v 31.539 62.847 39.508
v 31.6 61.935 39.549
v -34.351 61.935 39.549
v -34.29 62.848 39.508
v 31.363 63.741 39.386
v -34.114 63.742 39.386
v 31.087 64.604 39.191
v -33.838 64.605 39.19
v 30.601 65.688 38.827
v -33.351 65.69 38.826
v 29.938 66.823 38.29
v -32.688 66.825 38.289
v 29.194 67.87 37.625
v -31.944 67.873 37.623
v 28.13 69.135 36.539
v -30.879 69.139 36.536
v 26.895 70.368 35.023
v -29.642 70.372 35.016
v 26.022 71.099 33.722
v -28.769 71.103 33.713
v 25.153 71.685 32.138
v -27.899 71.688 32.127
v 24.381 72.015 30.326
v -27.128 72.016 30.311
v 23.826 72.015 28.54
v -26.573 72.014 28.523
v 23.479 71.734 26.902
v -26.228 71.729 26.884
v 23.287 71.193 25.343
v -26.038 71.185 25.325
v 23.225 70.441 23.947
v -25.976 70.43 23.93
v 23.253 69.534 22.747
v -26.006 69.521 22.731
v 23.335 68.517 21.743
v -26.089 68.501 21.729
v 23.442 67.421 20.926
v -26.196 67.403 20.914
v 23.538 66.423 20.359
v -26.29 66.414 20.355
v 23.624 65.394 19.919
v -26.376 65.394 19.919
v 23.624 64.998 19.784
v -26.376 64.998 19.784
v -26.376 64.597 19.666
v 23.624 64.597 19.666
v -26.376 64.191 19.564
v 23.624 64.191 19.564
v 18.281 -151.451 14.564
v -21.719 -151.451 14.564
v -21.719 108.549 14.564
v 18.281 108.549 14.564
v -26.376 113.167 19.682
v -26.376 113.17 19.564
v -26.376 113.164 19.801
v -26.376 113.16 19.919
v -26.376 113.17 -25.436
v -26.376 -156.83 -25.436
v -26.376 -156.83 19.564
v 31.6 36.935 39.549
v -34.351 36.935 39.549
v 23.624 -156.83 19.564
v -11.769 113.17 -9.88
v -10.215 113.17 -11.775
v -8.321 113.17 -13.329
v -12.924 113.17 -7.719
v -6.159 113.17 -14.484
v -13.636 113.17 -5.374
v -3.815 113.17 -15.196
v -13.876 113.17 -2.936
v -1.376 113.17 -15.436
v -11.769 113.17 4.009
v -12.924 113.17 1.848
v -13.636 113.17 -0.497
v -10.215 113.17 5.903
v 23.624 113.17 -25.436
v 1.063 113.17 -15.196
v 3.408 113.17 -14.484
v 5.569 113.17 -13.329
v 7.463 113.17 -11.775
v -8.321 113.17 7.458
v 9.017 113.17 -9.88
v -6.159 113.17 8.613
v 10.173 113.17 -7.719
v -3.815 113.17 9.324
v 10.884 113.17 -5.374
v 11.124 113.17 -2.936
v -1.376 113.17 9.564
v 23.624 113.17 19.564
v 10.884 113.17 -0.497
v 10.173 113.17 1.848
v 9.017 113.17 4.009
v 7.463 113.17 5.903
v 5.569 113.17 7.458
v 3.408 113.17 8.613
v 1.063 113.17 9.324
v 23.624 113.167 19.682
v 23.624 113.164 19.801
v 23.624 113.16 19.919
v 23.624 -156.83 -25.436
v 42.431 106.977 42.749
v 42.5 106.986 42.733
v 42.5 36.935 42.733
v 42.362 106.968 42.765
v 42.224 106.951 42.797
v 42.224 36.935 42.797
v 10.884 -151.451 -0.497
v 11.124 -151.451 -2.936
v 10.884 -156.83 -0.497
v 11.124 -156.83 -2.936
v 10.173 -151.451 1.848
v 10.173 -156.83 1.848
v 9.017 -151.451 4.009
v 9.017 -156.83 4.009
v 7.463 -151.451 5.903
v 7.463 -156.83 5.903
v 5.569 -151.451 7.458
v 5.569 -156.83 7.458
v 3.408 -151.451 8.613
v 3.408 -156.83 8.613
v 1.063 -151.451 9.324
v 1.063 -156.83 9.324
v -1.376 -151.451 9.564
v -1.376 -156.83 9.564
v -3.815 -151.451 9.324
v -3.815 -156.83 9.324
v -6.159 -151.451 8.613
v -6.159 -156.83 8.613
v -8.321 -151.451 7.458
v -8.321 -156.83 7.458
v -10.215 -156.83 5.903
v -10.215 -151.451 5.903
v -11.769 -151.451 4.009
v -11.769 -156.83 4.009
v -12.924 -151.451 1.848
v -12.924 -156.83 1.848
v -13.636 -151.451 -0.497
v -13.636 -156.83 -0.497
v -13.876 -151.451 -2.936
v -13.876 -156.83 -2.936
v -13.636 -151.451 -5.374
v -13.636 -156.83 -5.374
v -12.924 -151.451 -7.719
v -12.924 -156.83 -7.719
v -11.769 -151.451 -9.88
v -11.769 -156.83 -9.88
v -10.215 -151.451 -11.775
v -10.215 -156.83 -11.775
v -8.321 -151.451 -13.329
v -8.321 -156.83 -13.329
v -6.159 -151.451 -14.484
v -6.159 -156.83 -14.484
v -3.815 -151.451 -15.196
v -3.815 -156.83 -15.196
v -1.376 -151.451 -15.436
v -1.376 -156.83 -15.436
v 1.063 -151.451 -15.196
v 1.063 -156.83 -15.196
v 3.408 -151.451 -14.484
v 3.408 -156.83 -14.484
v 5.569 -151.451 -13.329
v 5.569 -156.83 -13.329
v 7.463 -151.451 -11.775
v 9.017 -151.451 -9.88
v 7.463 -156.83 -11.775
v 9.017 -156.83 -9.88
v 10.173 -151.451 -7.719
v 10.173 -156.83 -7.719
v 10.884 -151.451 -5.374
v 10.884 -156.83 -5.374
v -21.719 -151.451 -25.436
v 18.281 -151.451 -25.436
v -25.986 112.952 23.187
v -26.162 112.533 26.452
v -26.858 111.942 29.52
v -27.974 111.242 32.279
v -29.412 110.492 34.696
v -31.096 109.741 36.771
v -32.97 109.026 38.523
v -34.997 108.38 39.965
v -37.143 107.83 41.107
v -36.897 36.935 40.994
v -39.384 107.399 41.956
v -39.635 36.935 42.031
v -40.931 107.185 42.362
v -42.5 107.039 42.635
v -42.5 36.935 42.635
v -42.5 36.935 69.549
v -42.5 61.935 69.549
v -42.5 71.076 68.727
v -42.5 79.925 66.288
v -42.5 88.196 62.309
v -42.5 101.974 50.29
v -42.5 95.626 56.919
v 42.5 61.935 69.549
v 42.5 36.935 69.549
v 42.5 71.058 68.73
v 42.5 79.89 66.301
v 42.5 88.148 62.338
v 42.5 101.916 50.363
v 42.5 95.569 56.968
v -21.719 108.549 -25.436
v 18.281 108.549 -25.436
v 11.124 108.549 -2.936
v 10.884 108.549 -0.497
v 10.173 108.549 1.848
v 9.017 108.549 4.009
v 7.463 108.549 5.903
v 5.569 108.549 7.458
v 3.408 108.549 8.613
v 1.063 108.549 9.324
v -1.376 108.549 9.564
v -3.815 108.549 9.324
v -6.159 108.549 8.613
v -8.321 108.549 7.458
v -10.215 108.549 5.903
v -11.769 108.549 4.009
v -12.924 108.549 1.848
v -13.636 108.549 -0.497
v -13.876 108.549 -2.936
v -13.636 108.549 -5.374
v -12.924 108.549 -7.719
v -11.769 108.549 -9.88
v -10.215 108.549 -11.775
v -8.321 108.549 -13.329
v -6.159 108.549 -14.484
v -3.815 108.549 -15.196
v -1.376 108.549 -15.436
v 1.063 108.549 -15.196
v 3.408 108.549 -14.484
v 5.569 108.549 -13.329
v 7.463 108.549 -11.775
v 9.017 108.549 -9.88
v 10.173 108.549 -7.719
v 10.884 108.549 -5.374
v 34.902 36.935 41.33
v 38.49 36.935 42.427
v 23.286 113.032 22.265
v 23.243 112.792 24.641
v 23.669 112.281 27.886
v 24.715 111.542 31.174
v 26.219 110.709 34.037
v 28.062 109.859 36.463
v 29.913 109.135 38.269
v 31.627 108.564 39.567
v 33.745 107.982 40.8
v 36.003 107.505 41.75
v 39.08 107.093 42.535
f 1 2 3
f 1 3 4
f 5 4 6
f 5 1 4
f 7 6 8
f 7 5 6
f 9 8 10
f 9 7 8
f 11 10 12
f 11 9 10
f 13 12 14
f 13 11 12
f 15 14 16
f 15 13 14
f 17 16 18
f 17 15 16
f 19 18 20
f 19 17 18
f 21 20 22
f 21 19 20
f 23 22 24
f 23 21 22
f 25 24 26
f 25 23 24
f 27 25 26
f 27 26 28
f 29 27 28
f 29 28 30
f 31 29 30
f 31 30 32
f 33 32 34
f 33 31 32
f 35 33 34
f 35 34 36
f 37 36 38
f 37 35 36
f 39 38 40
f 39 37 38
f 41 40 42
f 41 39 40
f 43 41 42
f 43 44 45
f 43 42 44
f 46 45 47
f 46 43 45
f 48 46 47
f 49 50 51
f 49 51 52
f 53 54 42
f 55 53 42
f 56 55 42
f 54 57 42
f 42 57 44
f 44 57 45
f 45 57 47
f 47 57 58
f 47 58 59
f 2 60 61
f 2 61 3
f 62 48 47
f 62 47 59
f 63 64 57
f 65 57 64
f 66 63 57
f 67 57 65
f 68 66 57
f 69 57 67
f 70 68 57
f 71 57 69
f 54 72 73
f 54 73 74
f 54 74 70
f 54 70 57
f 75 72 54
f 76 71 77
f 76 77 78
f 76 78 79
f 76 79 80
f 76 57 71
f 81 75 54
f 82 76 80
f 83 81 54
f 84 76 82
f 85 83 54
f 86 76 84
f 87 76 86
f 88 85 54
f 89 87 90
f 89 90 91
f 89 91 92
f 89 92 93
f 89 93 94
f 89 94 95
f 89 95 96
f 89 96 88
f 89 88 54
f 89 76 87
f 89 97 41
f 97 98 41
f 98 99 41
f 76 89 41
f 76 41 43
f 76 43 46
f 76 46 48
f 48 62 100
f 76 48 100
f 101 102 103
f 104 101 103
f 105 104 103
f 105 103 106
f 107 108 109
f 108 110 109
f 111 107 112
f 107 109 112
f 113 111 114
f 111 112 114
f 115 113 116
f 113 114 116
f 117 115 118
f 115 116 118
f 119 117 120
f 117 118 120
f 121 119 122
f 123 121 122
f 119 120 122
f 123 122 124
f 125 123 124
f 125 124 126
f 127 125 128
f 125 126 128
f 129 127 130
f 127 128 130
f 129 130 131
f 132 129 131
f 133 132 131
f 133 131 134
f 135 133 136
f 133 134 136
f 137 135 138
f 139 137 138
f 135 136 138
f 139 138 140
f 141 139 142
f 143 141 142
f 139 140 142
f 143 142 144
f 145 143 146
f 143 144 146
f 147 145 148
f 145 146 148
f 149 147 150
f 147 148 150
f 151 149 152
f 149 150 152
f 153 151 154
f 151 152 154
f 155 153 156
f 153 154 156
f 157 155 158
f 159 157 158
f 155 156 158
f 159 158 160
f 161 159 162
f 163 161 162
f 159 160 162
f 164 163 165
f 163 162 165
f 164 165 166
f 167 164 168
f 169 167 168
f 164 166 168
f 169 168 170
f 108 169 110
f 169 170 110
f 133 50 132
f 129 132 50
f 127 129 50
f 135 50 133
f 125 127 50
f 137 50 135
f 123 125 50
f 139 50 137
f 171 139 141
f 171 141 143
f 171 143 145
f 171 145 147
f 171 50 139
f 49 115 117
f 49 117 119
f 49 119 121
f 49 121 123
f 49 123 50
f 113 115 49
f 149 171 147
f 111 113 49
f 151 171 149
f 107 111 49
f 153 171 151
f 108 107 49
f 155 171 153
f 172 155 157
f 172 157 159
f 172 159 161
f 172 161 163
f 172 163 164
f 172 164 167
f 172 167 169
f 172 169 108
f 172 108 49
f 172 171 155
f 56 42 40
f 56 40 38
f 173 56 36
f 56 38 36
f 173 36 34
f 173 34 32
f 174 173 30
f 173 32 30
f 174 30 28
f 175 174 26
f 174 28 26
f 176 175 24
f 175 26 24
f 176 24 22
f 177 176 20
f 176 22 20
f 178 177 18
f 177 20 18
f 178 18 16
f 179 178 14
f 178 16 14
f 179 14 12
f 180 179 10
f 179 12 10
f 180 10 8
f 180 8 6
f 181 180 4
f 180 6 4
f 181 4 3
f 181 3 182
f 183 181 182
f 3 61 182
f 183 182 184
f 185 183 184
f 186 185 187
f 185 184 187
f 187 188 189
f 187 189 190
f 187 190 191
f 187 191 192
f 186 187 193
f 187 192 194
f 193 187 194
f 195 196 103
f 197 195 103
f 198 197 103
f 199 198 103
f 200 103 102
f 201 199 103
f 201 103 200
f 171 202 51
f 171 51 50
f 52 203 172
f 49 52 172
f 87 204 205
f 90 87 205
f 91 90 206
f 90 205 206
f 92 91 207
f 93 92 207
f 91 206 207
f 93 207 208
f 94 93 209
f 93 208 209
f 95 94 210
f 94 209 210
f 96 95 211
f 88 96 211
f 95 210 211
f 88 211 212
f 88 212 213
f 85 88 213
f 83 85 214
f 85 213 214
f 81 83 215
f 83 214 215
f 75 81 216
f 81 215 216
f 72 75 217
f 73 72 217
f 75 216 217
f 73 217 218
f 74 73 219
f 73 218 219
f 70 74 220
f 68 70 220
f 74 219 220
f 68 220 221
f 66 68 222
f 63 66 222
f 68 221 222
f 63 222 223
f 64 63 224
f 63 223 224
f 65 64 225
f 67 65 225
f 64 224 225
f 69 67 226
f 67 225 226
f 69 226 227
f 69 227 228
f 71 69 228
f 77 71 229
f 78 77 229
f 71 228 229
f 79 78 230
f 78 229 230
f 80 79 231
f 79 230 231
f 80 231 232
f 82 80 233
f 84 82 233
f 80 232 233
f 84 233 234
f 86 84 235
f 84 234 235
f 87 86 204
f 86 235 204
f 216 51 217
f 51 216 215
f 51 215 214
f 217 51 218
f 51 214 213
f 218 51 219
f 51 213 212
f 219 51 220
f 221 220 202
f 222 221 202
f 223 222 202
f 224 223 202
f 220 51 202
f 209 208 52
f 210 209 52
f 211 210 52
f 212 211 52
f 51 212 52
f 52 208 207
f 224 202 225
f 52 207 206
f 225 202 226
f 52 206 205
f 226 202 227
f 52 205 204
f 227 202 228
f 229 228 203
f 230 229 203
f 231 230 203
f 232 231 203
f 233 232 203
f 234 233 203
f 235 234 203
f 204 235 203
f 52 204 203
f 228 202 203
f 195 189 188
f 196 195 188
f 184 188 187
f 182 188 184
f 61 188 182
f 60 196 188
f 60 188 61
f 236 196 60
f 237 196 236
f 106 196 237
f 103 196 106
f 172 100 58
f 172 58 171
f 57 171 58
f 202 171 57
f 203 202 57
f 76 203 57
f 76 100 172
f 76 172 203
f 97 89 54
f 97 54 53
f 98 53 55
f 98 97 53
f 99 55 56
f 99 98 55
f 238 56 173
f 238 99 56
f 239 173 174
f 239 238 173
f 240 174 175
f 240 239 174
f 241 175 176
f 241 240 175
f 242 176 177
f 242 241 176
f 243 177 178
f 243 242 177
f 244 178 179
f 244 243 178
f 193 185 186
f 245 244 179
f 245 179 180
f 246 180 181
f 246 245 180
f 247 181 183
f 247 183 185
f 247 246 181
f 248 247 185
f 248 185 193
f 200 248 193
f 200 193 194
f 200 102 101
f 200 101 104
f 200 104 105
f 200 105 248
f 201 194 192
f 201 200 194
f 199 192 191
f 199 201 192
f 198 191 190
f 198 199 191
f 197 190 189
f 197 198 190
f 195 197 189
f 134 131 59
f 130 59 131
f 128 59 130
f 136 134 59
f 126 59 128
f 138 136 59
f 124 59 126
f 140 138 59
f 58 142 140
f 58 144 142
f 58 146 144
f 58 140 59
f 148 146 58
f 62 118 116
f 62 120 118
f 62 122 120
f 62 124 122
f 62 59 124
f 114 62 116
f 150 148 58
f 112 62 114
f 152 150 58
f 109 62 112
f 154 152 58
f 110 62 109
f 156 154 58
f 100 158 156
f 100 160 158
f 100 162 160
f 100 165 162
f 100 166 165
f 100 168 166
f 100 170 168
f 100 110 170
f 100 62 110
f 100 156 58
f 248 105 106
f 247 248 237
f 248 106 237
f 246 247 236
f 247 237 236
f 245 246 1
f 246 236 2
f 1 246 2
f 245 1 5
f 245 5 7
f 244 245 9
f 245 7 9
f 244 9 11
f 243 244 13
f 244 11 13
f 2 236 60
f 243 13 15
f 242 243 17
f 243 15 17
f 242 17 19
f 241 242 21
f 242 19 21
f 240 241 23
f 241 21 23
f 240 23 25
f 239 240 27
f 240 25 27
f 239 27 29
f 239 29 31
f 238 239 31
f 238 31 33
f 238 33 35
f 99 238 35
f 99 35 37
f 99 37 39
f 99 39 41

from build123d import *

# Parameters (mm, degrees)
F1_DEPTH = 42.5
F3_DEPTH = 174
F4_R     = 12.5
F5_DEPTH = 266
F6_W     = 40
F6_H     = 260
F7_DEPTH = 40


with BuildPart() as f1:
    # F0 (on Right) → F1 (new body, symmetric)
    with BuildSketch(Plane.YZ):
        with BuildLine():
            ThreePointArc((61.934647, 39.548864), (71.990491, 30.564401), (64.190836, 19.564131))
            Line((64.190836, 19.564131), (52.245142, 19.564131))
            Line((52.245142, 19.564131), (-156.829834, 19.564131))
            Line((-156.829834, 19.564131), (-156.829834, -25.435869))
            Line((-156.829834, -25.435869), (113.170166, -25.435869))
            Line((113.170166, -25.435869), (113.170166, 19.564131))
            ThreePointArc((113.170166, 19.564131), (97.724143, 54.982764), (61.934647, 69.548864))
            Line((61.934647, 69.548864), (36.934647, 69.548864))
            Line((36.934647, 69.548864), (36.934647, 39.548864))
            Line((36.934647, 39.548864), (61.934647, 39.548864))
        make_face()
    extrude(amount=F1_DEPTH, both=True)

    # F2 (on Front) → F3 (cut, symmetric)
    with BuildSketch(Plane.XZ):
        with BuildLine():
            Line((23.624079, 19.918991), (23.624079, -36.902788))
            Line((23.624079, -36.902788), (-26.375921, -36.902788))
            Line((-26.375921, -36.902788), (-26.375921, 19.918991))
            ThreePointArc((-26.375921, 19.918991), (-30.233422, 35.78282), (-44.975936, 42.797067))
            Line((-44.975936, 42.797067), (-64.052075, -61.106175))
            Line((-64.052075, -61.106175), (44.571461, -67.325629))
            Line((44.571461, -67.325629), (64.148389, 37.735406))
            Line((64.148389, 37.735406), (42.224093, 42.797067))
            ThreePointArc((42.224093, 42.797067), (27.481579, 35.78282), (23.624079, 19.918991))
        make_face()
    extrude(amount=F3_DEPTH, both=True, mode=Mode.SUBTRACT)

    # F4 (on Front) → F5 (cut, symmetric)
    with BuildSketch(Plane.XZ):
        with Locations((-1.375921, -2.935869)):
            Circle(F4_R)
    extrude(amount=F5_DEPTH, both=True, mode=Mode.SUBTRACT)

    # F6 (on face) → F7 (cut)
    with BuildSketch(Plane(origin=(0, 0, -25.435869), x_dir=(1, 0, 0), z_dir=(0, 0, -1))):
        with Locations((-1.719187, 21.451403)):
            Rectangle(F6_W, F6_H)
    extrude(amount=-F7_DEPTH, mode=Mode.SUBTRACT)


solid = f1.part
